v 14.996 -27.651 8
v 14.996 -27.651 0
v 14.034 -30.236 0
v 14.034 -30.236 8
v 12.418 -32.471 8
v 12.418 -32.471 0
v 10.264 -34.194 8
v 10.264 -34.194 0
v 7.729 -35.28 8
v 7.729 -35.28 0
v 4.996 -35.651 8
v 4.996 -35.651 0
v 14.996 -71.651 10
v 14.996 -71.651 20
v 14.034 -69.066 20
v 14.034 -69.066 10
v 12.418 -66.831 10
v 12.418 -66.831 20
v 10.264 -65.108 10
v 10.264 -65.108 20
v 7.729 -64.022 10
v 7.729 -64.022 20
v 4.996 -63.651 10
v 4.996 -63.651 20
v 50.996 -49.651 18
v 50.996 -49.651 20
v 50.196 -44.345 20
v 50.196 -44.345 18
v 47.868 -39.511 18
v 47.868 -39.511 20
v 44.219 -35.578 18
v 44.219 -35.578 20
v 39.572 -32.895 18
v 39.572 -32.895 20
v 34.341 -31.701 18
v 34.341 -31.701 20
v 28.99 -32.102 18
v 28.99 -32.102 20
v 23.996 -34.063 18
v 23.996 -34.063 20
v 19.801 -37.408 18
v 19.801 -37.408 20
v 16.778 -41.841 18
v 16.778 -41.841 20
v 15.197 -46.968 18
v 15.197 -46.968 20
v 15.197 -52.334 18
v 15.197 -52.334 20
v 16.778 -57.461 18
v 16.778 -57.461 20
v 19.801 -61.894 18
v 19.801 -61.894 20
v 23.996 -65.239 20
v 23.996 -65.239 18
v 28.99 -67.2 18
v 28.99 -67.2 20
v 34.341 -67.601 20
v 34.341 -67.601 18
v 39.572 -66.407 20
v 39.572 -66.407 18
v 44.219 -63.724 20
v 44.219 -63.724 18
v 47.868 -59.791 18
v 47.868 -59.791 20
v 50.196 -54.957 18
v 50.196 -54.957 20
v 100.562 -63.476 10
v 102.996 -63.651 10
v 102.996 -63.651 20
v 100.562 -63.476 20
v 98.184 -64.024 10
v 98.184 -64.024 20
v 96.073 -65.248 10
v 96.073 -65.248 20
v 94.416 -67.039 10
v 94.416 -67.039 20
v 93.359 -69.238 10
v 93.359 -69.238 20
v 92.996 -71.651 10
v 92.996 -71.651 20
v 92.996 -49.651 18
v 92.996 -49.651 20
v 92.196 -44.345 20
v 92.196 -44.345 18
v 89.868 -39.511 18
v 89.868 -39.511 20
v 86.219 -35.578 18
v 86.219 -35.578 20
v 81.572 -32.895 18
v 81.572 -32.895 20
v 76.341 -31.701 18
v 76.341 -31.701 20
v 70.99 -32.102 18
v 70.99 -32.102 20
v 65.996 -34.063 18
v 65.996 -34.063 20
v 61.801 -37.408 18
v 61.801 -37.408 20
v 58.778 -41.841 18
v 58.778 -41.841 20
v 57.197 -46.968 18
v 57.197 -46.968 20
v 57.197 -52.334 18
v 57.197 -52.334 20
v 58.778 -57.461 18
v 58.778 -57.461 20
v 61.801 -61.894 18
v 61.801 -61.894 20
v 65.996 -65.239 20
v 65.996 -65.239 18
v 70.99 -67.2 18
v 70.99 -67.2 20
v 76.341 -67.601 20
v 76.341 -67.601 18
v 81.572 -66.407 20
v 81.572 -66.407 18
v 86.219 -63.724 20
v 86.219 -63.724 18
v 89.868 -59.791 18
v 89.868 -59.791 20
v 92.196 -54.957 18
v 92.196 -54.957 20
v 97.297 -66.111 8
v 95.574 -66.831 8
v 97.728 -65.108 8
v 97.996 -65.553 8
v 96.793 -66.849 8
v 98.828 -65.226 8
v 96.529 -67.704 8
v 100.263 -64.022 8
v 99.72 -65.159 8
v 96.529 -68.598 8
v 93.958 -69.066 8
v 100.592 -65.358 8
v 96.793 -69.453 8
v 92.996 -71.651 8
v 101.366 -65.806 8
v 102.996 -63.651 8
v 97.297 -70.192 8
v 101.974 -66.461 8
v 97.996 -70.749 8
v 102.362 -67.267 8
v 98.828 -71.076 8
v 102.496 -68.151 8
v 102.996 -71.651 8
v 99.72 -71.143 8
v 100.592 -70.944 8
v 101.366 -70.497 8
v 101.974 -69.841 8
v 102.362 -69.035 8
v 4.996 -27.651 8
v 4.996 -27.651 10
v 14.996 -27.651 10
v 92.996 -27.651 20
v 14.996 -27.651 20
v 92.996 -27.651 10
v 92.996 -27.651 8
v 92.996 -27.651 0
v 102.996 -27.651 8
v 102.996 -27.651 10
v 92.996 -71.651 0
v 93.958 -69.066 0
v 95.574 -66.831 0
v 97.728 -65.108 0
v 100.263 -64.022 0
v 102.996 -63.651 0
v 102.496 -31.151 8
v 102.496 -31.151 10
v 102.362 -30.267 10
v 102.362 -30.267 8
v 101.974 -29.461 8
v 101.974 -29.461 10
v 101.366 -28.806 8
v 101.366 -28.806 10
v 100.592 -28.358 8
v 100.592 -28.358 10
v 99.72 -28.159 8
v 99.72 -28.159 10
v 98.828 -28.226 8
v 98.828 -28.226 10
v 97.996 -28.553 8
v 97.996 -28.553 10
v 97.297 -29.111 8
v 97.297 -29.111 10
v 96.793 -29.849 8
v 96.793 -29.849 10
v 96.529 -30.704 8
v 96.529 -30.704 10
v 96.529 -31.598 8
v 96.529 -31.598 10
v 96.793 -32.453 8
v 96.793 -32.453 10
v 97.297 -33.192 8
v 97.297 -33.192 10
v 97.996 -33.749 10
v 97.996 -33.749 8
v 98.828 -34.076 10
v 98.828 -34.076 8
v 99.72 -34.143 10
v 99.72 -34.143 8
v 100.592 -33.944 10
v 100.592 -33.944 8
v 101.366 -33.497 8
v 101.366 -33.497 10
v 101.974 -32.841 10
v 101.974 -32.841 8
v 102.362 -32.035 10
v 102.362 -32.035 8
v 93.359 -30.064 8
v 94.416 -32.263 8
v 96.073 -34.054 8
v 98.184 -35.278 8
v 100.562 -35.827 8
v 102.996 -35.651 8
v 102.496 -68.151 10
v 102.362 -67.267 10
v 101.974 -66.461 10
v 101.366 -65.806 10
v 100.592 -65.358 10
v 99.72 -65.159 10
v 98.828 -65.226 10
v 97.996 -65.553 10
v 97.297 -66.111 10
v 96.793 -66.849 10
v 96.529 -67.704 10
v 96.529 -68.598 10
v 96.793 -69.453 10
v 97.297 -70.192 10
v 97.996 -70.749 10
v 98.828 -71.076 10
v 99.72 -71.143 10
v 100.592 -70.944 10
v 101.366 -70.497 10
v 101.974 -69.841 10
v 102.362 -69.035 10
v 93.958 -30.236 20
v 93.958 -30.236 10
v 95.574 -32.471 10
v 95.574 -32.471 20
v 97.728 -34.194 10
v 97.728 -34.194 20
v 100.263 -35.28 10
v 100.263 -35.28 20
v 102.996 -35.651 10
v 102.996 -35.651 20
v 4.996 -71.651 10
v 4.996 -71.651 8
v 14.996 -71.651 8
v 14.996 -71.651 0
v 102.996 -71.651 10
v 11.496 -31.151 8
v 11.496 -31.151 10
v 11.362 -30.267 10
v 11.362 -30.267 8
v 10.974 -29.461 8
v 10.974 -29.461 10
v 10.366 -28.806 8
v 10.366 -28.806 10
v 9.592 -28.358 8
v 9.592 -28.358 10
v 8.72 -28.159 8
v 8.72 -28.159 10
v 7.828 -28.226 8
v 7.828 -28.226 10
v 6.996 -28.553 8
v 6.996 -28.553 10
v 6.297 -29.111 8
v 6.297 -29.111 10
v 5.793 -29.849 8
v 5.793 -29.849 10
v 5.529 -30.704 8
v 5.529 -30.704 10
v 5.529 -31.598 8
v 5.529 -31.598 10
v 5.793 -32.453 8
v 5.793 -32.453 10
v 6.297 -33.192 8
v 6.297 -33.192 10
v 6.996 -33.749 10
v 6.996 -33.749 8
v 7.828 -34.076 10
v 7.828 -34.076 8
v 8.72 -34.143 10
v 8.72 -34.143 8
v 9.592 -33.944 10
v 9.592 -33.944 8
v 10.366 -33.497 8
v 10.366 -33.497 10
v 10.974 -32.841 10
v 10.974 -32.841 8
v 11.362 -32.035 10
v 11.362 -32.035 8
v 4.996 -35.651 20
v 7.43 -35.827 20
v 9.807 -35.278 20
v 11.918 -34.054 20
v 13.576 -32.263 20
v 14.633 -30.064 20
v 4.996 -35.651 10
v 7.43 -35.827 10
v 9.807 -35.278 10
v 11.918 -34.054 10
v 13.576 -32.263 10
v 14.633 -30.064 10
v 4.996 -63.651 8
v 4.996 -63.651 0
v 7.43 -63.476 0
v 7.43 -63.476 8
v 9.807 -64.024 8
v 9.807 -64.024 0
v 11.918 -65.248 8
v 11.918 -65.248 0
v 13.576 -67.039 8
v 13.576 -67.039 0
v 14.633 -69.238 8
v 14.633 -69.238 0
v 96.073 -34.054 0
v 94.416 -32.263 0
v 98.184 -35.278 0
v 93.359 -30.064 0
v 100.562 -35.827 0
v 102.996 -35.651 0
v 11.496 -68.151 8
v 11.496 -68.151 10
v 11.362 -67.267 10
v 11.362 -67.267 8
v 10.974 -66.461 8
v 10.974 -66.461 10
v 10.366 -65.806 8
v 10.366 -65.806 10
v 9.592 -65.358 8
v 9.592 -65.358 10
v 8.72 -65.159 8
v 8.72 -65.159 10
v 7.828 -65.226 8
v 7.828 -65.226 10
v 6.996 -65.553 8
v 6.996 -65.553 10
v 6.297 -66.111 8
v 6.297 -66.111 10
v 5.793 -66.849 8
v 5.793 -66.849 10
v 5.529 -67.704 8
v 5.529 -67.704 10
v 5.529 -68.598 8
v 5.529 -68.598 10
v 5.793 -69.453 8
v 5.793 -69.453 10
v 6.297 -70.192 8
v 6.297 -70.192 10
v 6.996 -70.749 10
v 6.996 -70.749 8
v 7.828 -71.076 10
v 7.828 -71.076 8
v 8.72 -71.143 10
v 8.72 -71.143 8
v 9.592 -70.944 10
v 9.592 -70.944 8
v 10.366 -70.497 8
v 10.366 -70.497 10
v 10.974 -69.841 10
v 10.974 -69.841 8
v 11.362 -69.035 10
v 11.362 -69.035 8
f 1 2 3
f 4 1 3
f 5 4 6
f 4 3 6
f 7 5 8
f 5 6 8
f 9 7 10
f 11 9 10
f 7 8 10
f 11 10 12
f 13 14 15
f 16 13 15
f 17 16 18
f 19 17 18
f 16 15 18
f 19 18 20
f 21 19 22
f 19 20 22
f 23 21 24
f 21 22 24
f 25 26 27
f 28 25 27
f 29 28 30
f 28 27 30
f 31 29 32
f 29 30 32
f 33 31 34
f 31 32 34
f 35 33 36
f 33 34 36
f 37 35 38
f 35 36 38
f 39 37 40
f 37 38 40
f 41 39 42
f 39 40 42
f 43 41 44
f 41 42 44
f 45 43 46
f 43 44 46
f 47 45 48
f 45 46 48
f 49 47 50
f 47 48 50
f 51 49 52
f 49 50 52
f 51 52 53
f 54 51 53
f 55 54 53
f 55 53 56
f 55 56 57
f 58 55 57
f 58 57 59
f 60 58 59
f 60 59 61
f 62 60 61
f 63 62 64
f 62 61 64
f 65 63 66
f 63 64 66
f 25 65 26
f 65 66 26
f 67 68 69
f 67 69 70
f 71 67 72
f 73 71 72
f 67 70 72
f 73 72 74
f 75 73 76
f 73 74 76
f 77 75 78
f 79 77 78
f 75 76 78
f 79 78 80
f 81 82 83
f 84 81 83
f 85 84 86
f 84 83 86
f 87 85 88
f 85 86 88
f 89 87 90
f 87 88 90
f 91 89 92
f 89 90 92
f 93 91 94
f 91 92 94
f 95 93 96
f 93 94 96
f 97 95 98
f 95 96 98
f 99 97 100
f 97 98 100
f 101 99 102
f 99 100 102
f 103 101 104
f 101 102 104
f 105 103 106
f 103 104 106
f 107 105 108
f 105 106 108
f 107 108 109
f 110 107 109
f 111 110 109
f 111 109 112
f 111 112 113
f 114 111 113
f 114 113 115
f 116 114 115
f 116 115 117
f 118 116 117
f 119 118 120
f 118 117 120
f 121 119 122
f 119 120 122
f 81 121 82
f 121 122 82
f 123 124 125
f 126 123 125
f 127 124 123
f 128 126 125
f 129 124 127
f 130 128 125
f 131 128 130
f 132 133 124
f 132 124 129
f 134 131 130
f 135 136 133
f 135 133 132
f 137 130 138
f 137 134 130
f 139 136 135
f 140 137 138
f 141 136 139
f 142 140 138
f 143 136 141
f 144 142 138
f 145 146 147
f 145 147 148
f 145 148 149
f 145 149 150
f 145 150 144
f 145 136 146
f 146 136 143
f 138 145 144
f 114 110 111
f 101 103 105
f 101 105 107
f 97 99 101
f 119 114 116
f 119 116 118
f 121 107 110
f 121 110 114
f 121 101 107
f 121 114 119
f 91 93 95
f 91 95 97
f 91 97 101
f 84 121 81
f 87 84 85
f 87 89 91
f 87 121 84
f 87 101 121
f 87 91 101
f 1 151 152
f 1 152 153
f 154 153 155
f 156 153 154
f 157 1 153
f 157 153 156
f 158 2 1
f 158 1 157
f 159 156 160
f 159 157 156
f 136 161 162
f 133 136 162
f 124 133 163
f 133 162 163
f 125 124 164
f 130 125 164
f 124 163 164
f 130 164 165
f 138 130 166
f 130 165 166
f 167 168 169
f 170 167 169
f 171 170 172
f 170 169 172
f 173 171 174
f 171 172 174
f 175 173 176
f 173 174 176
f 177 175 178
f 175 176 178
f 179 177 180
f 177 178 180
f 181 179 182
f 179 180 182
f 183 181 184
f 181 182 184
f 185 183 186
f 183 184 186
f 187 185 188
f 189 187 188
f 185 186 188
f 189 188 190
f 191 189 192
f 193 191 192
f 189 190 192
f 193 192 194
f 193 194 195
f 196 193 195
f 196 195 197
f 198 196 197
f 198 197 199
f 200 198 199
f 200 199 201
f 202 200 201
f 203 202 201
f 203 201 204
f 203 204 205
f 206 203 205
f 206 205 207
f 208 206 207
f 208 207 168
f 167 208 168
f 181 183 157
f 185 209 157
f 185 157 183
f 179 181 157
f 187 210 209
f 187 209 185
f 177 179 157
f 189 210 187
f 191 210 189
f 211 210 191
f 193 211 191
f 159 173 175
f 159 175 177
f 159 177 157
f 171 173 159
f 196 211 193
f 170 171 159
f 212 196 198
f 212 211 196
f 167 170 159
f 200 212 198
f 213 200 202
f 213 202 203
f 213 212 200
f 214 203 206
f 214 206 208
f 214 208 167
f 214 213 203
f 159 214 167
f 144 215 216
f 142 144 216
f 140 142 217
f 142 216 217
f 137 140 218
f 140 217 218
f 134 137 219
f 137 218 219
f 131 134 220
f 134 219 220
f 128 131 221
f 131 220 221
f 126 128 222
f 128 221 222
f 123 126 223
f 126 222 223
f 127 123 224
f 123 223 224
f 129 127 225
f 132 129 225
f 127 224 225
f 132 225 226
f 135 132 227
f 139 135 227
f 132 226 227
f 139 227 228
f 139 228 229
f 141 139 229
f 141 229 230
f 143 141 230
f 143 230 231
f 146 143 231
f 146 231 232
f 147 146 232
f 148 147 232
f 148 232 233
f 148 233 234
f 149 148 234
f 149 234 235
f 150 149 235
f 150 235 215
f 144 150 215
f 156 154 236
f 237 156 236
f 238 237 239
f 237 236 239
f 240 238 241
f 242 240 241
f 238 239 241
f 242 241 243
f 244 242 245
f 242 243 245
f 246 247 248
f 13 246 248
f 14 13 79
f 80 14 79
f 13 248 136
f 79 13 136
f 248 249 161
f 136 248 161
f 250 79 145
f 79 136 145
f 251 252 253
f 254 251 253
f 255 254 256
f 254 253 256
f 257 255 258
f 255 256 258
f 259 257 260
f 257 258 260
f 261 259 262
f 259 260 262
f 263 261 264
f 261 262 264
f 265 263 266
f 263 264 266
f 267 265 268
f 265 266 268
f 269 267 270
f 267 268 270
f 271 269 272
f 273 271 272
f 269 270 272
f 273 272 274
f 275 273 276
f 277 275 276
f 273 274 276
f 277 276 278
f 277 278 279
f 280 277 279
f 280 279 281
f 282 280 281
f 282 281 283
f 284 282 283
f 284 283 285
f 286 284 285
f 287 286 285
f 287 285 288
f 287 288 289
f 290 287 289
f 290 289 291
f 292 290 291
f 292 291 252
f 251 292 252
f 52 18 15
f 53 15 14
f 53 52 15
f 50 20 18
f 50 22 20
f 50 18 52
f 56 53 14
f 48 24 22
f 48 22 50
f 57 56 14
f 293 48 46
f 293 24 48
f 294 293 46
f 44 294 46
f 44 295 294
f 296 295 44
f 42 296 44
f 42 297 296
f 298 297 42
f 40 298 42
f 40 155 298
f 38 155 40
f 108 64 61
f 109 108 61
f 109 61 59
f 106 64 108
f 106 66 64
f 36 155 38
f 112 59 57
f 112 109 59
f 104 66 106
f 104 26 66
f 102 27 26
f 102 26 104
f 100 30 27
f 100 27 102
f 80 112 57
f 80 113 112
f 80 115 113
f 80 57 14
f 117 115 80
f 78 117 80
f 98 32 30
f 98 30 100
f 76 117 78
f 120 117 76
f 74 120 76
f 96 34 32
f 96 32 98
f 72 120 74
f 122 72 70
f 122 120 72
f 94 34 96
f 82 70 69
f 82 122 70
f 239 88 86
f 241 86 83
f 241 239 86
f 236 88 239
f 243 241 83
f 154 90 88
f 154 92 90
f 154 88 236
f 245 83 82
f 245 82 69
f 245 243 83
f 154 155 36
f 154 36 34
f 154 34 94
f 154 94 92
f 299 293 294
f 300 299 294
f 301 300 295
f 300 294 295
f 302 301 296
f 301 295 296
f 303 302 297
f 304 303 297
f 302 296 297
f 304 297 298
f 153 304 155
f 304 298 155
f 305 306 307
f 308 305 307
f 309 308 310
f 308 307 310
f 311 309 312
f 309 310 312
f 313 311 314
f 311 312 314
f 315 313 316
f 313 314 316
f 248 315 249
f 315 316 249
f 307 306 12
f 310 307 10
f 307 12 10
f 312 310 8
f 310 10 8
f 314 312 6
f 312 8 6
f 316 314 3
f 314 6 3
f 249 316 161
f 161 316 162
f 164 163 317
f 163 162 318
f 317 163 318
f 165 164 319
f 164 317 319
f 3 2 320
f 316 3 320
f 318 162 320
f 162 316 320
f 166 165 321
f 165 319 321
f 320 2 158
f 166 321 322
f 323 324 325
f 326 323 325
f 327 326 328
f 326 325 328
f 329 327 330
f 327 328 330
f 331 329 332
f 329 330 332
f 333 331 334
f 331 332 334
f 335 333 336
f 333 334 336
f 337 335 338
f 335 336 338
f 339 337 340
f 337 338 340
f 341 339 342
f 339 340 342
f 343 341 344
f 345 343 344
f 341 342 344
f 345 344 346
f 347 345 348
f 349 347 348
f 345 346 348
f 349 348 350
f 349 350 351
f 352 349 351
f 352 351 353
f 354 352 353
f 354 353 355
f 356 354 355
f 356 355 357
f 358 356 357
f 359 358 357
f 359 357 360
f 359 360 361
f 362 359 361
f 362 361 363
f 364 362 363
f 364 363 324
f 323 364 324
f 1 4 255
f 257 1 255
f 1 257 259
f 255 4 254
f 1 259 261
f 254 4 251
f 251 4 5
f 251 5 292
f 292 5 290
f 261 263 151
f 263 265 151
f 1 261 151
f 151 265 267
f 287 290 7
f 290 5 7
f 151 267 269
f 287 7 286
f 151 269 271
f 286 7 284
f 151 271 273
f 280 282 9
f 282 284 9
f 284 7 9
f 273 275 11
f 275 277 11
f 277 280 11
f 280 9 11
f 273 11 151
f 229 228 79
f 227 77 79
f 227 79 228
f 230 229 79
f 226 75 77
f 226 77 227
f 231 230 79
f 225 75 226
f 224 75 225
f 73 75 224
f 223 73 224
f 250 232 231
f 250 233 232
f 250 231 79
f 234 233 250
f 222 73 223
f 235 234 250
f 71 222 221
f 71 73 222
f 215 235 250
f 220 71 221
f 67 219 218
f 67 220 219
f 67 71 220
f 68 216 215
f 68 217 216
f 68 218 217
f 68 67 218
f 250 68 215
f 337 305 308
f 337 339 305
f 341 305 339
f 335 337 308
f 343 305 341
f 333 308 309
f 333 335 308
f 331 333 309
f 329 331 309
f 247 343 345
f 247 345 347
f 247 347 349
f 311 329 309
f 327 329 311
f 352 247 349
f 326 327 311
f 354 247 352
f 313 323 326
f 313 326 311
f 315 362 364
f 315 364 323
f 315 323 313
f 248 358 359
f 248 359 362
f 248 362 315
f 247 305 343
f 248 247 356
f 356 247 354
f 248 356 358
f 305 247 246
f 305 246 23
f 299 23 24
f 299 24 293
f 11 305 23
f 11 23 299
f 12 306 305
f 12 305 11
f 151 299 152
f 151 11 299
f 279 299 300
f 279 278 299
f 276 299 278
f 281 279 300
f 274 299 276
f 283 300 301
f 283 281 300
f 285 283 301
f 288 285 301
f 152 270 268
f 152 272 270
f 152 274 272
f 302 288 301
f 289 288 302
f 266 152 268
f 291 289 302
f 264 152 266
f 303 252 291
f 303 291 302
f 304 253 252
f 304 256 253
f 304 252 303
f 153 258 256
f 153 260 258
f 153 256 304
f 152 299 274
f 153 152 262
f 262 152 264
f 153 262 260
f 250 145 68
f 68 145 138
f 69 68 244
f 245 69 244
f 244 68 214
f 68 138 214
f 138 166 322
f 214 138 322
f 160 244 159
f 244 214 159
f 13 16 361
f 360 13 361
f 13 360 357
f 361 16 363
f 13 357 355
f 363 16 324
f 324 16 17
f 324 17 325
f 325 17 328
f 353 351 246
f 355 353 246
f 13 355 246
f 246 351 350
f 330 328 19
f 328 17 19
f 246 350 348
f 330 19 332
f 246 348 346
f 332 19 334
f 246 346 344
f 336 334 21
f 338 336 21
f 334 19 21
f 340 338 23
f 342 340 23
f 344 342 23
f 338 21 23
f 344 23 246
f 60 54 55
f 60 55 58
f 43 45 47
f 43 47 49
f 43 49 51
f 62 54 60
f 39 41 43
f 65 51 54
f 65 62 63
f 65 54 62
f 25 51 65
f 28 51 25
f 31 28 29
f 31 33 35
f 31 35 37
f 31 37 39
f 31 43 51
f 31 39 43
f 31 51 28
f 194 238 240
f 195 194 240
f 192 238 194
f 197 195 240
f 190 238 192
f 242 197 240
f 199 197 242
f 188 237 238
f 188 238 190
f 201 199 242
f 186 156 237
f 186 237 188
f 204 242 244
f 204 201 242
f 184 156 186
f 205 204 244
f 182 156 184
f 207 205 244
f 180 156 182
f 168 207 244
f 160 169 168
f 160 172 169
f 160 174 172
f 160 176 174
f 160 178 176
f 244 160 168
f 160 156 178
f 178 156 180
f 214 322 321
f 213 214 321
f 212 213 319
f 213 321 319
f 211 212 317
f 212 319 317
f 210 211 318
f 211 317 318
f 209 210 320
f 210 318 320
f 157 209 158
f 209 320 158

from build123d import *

# Parameters (mm, degrees)
SKETCH002_W     = 98
SKETCH002_H     = 44
PAD001_DEPTH    = 20
POCKET001_DEPTH = 10
POCKET002_DEPTH = 8
SKETCH005_R     = 3
HOLE_DEPTH      = 25
SKETCH006_R     = 18
POCKET003_DEPTH = 2


with BuildPart() as part:
    # Sketch002 → Pad001 (new body)
    with BuildSketch(Plane.XY):
        with Locations((49, 22)):
            Rectangle(SKETCH002_W, SKETCH002_H)
    extrude(amount=PAD001_DEPTH)

    # Sketch003 (on Face6 of Pad001) → Pocket001 (cut)
    with BuildSketch(Plane.XY.offset(20)):
        with BuildLine():
            Line((0, 44), (0, 36))
            ThreePointArc((0, 36), (6.922499, 37.596876), (10, 44))
            Line((0, 44), (10, 44))
        make_face()
        with BuildLine():
            Line((0, 0), (0, 8))
            ThreePointArc((10, 0), (6.403124, 5.753905), (0, 8))
            Line((0, 0), (10, 0))
        make_face()
        with BuildLine():
            Line((98, 36), (98, 44))
            Line((98, 44), (88, 44))
            ThreePointArc((88, 44), (91.596876, 38.246095), (98, 36))
        make_face()
        with BuildLine():
            Line((88, 0), (98, 0))
            Line((98, 0), (98, 8))
            ThreePointArc((98, 8), (91.077501, 6.403124), (88, 0))
        make_face()
    extrude(amount=-POCKET001_DEPTH, mode=Mode.SUBTRACT)

    # Sketch004 (on Face2 of Pocket001) → Pocket002 (cut)
    with BuildSketch(Plane(origin=(0, 0, 0), x_dir=(1, 0, 0), z_dir=(0, 0, -1))):
        with BuildLine():
            Line((10, -44), (0, -44))
            Line((0, -36), (0, -44))
            ThreePointArc((10, -44), (6.403124, -38.246095), (0, -36))
        make_face()
        with BuildLine():
            Line((0, 0), (0, -8))
            ThreePointArc((0, -8), (6.922499, -6.403124), (10, 0))
            Line((0, 0), (10, 0))
        make_face()
        with BuildLine():
            Line((98, 0), (88, 0))
            ThreePointArc((88, 0), (91.596876, -5.753905), (98, -8))
            Line((98, 0), (98, -8))
        make_face()
        with BuildLine():
            Line((88, -44), (98, -44))
            Line((98, -44), (98, -36))
            ThreePointArc((98, -36), (91.077501, -37.596876), (88, -44))
        make_face()
    extrude(amount=-POCKET002_DEPTH, mode=Mode.SUBTRACT)

    # Sketch005 (on Face21 of Pocket002) → Hole (cut)
    with BuildSketch(Plane.XY.offset(10)):
        with Locations((3.5, 3.5)):
            Circle(SKETCH005_R)
        with Locations((3.5, 40.5)):
            Circle(SKETCH005_R)
        with Locations((94.5, 40.5)):
            Circle(SKETCH005_R)
        with Locations((94.5, 3.5)):
            Circle(SKETCH005_R)
    extrude(amount=-HOLE_DEPTH, mode=Mode.SUBTRACT)

    # Sketch006 (on Face8 of Hole) → Pocket003 (cut)
    with BuildSketch(Plane.XY.offset(20)):
        with Locations((28, 22)):
            Circle(SKETCH006_R)
        with Locations((70, 22)):
            Circle(SKETCH006_R)
    extrude(amount=-POCKET003_DEPTH, mode=Mode.SUBTRACT)


with BuildPart() as part_1:
    # Body001 placement: moved
    add(part.part.moved(Location((4.995761, -71.651041, 0))))


solid = part_1.part
